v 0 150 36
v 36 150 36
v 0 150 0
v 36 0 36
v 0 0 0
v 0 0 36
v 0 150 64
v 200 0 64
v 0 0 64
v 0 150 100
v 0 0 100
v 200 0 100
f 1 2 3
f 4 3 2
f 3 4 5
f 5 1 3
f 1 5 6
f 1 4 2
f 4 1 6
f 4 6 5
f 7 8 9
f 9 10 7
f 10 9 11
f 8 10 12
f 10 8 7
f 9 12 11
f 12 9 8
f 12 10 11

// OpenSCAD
// Massstab 1 entspricht einem cm

module cutpart(length, height, depth) {
	polyhedron ( points = [
			[0, height, -depth], 
			[0, 0, -depth], 
			[length, 0, -depth], 
			[0, height, 0], 
			[0, 0, 0], 
			[length, 0, 0], ], 
		triangles = [
			[0, 1, 2], 
			[0, 5, 3],
			[4, 1, 0],
			[0, 3, 4],
			[5, 3, 0],
			[0, 2, 5],
			[4, 2, 1],
			[2, 4, 5],
			[5, 4, 3], ]);
}

module antiprism(height, depth) {
	polyhedron ( points = [
			[0, height, 0], 
			[0, height, depth], 
			[depth, height, depth], 
			[0, 0, 0], 
			[0, 0, depth], 
			[depth, 0, depth], ], 
		triangles = [
			[2, 1, 0], 
			[3, 5, 0],
			[0, 1, 4],
			[4, 3, 0],
			[0, 3, 5],
			[5, 2, 0],
			[1, 2, 4],
			[5, 4, 2],
			[3, 4, 5], ]);
}

antiprism (150, 36);

translate([0, 0, 100])
	cutpart (200, 150, 36);
